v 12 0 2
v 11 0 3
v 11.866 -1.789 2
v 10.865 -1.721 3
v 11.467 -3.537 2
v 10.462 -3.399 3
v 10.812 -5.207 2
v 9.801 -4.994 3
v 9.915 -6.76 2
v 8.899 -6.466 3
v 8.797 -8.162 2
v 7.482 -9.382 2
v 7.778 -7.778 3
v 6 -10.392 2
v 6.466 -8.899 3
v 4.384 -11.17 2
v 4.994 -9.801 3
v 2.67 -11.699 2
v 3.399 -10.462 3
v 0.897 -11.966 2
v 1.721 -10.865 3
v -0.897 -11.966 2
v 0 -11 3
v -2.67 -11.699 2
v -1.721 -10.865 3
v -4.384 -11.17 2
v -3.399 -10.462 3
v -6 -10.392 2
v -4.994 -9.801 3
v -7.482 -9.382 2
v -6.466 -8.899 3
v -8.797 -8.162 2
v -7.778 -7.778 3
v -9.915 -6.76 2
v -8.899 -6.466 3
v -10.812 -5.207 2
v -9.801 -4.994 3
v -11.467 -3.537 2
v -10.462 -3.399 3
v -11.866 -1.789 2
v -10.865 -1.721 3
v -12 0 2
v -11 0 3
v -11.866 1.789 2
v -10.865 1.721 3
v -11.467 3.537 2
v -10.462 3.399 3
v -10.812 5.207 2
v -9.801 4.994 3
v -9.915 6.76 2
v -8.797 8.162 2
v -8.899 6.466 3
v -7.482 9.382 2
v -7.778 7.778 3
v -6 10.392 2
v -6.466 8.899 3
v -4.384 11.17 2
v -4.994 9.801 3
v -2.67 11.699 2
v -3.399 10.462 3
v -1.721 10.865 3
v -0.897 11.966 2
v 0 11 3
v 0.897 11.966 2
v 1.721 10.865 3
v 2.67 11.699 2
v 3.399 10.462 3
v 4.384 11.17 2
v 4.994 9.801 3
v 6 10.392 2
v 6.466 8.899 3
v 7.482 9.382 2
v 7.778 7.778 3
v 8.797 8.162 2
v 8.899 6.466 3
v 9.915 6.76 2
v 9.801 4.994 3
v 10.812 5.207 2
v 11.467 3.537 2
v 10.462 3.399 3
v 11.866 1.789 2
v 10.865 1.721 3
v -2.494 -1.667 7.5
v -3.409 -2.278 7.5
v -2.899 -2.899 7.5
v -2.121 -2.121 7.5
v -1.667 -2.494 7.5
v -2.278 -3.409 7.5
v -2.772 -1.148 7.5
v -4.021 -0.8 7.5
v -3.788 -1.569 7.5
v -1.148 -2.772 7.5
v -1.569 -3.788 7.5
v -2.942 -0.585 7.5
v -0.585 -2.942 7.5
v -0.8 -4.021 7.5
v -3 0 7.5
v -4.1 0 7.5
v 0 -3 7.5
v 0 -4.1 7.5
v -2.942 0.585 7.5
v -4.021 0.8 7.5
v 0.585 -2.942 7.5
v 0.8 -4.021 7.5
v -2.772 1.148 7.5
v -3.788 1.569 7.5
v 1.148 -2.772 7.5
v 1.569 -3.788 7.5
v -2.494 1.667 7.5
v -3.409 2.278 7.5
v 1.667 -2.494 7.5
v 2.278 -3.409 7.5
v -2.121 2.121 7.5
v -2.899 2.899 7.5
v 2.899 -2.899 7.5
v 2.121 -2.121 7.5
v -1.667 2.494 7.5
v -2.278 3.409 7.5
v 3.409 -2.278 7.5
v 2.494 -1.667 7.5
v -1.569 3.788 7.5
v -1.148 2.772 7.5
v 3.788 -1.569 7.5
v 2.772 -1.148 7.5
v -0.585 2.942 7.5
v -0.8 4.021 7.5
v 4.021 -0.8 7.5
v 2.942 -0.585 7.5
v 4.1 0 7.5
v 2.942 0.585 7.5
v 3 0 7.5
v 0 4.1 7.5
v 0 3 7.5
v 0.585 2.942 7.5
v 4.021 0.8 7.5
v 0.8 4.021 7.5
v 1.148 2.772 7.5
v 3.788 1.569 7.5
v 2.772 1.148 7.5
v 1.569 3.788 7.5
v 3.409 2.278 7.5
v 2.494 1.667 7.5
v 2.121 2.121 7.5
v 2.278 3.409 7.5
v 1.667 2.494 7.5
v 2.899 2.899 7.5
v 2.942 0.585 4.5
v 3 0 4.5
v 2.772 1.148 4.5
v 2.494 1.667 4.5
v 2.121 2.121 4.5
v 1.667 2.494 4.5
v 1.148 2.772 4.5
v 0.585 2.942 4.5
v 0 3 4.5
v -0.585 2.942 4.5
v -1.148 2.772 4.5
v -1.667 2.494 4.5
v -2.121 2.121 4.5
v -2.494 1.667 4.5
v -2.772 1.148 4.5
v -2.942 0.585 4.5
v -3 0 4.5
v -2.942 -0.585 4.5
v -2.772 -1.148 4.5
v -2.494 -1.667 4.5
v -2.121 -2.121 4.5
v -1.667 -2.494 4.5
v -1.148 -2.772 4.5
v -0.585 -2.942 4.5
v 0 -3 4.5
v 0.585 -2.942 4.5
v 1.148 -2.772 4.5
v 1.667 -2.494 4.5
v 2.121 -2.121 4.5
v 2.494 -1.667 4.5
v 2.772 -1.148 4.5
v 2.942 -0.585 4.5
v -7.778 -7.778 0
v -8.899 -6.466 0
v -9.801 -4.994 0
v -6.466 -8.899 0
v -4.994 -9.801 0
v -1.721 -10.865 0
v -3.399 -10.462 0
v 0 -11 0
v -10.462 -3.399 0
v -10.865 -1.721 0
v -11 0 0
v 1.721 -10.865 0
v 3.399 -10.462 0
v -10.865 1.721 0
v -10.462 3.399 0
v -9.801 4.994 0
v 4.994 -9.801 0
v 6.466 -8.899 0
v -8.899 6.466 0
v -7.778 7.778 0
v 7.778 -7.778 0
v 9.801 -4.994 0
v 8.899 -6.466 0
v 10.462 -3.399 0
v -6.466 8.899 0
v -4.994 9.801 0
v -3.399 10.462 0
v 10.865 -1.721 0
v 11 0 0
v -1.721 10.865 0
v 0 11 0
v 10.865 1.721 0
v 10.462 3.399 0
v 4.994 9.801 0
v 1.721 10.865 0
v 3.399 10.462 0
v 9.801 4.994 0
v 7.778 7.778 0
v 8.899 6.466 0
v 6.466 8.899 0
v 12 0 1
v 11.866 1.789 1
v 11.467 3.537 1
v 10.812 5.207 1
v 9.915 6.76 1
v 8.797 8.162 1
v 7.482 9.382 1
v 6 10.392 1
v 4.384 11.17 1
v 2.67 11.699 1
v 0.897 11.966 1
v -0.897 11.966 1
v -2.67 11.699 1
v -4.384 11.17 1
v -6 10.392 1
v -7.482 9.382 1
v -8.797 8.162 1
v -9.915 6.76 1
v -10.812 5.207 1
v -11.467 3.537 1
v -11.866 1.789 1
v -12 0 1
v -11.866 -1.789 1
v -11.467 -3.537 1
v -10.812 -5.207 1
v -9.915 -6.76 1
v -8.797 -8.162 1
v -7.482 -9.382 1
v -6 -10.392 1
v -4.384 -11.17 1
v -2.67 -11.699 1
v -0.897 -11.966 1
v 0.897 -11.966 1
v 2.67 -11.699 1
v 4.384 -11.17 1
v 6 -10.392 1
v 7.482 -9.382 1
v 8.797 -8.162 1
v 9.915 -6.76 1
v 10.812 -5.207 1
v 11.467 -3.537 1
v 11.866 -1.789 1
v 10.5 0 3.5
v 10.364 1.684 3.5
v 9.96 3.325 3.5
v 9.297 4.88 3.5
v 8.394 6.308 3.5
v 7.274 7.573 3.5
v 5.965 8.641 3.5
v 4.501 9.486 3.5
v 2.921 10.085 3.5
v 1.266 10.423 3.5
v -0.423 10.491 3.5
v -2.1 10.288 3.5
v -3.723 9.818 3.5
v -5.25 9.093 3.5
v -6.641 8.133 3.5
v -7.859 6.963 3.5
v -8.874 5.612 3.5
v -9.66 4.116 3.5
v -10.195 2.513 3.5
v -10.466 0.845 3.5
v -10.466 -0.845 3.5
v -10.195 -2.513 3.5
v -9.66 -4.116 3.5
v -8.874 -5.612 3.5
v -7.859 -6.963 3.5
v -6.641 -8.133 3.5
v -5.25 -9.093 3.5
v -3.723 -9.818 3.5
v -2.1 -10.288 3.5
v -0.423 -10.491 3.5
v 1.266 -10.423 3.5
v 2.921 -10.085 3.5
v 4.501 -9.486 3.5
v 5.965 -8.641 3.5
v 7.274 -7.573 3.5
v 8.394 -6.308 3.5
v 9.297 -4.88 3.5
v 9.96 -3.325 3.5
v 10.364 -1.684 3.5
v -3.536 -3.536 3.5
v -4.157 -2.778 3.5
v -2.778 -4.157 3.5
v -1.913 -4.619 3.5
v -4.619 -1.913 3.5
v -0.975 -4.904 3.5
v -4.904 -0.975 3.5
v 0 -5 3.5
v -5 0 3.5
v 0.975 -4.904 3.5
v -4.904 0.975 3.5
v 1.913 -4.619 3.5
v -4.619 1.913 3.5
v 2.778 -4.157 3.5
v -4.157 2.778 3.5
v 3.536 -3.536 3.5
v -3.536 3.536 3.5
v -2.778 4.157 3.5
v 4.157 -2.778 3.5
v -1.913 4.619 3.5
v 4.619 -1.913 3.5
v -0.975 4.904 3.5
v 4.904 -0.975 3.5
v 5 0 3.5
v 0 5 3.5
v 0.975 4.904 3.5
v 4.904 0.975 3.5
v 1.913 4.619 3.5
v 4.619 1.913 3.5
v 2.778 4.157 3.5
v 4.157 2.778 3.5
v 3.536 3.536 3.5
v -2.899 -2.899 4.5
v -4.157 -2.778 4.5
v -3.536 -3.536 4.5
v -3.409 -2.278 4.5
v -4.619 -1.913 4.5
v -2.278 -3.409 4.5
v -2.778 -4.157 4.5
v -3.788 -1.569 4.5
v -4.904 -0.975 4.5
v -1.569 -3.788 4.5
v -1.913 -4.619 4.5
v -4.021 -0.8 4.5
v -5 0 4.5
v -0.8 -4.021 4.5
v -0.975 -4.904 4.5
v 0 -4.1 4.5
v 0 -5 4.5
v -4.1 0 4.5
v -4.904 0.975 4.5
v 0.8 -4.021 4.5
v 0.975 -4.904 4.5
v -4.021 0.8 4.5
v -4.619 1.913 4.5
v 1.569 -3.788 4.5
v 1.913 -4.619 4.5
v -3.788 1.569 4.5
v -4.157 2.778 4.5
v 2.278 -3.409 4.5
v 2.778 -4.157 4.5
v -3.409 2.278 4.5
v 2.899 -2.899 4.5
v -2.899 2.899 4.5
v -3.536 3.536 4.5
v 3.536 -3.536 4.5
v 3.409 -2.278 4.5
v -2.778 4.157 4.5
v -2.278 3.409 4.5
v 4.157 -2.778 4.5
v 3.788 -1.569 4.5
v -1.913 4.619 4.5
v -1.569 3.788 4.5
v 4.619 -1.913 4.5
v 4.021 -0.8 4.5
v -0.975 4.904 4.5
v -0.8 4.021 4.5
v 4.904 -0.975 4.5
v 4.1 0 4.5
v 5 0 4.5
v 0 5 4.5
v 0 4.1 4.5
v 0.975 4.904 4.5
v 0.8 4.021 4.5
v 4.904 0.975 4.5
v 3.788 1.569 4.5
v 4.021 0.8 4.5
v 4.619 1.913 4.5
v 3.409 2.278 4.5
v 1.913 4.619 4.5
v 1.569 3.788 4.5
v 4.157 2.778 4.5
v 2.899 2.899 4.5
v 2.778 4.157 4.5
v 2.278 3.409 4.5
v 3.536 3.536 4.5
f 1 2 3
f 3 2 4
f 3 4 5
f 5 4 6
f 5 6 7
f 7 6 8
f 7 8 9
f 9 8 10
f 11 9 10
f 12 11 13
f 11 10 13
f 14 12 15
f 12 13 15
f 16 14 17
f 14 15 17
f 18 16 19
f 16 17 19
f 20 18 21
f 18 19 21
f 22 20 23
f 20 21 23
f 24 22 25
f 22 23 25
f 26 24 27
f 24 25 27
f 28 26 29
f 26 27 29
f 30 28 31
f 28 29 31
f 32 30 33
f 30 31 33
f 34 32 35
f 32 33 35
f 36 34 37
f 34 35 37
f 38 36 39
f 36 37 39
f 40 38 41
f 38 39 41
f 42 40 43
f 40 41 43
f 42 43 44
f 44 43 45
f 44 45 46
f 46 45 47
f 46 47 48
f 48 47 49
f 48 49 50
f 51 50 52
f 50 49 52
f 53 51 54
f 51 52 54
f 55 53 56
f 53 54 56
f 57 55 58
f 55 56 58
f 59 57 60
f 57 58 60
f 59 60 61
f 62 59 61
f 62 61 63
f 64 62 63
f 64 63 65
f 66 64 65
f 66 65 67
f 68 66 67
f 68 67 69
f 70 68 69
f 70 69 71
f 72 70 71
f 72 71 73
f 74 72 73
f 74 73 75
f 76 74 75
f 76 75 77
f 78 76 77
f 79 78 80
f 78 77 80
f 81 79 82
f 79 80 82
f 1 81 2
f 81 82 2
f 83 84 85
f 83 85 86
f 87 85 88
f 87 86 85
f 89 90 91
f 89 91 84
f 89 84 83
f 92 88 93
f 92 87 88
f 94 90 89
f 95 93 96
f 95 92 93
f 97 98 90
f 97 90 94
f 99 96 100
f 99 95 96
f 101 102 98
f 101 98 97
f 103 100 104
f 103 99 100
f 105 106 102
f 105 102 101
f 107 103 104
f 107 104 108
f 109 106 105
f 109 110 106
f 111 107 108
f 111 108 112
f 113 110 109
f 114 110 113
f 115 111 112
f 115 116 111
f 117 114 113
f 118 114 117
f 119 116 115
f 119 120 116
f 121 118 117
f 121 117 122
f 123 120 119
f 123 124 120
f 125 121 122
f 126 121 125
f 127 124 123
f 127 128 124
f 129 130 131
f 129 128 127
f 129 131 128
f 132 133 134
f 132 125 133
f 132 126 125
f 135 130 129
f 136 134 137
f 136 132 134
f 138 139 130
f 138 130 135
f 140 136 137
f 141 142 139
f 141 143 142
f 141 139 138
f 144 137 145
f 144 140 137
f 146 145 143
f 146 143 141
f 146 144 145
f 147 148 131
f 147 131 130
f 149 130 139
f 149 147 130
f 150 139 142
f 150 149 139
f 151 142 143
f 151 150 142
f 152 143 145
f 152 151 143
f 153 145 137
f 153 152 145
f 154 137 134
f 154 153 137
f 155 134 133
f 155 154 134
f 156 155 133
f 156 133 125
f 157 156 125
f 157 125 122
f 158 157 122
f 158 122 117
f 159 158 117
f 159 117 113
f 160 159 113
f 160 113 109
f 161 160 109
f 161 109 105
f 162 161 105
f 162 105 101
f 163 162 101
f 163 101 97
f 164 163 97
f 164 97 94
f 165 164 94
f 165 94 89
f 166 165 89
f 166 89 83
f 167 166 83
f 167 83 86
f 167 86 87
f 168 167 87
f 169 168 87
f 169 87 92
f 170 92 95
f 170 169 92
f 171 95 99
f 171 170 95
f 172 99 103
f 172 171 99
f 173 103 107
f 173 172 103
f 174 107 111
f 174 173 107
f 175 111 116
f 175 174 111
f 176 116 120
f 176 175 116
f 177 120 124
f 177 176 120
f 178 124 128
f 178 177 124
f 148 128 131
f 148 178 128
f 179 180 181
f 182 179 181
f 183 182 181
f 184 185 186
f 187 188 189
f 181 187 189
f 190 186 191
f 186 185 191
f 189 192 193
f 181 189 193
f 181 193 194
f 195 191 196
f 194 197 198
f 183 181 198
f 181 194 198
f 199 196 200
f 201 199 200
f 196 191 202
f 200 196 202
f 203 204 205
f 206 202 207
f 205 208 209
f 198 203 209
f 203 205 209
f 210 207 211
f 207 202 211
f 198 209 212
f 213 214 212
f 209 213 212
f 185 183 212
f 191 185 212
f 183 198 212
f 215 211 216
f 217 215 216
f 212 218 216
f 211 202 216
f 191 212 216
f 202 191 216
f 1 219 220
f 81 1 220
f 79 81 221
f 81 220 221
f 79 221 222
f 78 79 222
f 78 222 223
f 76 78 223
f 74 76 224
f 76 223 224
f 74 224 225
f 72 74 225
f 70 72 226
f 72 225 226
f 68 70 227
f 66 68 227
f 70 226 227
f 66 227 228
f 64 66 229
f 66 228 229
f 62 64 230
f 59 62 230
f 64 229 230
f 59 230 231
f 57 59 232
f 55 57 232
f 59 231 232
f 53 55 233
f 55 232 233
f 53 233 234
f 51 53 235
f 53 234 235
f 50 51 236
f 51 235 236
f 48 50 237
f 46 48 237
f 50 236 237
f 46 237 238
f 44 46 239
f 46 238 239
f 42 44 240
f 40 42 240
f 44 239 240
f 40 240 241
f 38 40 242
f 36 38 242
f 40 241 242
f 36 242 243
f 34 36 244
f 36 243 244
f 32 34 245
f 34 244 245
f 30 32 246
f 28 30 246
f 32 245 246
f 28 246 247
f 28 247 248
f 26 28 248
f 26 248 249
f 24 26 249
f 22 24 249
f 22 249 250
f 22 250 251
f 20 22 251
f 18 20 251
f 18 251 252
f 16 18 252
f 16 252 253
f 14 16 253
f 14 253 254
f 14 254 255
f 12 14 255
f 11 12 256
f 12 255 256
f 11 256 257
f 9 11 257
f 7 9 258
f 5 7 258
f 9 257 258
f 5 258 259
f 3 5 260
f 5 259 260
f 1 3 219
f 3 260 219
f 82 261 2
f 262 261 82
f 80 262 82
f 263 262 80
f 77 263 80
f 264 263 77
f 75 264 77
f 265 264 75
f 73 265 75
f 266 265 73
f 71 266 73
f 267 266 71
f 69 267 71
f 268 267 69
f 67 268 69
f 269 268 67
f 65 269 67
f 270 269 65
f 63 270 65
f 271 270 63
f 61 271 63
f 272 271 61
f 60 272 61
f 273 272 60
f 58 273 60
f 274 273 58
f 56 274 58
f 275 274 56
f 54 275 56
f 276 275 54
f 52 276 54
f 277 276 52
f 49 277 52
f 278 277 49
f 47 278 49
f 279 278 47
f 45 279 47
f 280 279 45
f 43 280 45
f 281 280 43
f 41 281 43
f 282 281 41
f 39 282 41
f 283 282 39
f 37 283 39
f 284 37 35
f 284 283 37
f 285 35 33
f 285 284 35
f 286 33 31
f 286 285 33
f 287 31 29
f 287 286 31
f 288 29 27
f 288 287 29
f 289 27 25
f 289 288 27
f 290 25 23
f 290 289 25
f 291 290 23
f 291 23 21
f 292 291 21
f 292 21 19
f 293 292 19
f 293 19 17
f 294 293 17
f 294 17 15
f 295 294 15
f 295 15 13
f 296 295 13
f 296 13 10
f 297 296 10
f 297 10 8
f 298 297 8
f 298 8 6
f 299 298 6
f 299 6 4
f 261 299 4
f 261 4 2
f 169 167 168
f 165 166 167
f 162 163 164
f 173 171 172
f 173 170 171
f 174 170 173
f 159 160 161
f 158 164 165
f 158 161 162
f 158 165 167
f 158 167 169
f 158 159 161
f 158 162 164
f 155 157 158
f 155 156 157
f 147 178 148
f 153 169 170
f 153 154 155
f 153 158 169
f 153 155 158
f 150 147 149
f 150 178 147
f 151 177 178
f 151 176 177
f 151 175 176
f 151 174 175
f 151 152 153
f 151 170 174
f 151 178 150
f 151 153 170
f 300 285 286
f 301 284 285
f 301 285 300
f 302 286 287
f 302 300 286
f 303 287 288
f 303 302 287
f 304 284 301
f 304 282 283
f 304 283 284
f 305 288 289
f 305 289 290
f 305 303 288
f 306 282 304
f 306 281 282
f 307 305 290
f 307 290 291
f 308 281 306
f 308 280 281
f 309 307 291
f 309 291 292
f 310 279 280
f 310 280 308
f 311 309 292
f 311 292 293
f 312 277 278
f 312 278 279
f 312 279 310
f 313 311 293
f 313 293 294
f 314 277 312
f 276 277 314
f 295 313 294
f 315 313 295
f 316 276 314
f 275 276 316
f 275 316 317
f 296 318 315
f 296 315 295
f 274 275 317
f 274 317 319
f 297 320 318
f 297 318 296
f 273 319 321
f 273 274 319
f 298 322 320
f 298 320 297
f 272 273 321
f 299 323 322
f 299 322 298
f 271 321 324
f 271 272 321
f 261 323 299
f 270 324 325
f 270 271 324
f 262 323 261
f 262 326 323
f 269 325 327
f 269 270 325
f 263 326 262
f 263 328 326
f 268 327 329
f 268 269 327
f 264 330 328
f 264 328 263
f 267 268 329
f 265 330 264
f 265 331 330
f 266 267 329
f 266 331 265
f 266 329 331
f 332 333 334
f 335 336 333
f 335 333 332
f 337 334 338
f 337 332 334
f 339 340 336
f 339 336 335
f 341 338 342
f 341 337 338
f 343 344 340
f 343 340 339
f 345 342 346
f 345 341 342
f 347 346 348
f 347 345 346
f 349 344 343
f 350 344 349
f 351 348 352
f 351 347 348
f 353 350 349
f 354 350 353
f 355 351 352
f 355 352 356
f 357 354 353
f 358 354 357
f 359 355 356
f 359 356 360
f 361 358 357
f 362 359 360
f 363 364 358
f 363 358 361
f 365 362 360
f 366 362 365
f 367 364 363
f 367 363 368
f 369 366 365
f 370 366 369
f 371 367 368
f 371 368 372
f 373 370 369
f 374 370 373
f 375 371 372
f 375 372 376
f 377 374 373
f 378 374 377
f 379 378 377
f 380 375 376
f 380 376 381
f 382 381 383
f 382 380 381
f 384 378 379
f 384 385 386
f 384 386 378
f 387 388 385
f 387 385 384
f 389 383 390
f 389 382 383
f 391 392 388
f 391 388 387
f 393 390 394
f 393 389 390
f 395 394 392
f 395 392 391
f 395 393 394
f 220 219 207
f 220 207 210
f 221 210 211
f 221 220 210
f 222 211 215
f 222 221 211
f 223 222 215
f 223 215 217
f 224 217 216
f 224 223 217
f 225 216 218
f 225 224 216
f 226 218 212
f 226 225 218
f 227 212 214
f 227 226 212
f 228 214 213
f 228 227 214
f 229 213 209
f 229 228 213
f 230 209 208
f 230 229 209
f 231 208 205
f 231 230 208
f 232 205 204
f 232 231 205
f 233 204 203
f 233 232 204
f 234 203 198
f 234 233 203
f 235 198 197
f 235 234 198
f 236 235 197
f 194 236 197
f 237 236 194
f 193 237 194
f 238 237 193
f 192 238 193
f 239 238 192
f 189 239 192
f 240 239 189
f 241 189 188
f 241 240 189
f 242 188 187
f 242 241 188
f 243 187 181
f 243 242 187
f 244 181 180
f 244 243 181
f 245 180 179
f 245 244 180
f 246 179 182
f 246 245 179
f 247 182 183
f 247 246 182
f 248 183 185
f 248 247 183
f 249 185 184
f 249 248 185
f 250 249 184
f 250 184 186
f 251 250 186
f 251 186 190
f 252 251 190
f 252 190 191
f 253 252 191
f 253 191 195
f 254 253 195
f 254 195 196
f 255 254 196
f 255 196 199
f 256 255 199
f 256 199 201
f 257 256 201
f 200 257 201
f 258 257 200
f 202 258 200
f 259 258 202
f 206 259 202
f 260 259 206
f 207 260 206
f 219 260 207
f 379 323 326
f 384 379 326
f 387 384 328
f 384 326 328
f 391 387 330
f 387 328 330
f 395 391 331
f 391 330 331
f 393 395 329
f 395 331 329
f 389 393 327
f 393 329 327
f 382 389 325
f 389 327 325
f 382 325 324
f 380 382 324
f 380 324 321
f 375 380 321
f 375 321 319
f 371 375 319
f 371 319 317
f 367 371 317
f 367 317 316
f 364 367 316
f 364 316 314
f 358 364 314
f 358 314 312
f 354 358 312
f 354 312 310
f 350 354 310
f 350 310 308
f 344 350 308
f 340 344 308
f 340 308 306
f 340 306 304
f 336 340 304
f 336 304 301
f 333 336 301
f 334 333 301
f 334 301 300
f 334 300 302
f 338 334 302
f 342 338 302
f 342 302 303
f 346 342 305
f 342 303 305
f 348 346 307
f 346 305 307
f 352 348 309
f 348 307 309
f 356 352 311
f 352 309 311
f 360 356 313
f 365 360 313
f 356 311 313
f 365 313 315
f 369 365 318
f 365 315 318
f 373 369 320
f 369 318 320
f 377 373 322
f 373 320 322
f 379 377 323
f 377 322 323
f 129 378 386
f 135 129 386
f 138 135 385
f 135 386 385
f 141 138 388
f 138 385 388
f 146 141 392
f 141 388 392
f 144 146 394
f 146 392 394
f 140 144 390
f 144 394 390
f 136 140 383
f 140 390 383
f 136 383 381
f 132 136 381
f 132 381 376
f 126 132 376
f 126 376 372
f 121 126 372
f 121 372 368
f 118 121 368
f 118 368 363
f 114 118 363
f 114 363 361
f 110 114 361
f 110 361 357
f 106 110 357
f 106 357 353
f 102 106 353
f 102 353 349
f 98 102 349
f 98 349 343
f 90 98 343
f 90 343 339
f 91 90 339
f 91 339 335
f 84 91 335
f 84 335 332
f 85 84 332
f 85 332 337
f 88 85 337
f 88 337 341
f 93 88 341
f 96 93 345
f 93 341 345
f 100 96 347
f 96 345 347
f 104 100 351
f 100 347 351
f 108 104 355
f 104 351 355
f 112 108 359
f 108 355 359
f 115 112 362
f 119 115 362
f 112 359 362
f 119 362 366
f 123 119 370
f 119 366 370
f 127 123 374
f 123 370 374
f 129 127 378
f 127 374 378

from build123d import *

# Parameters (mm, degrees)
F0_R     = 12
F0_R_2   = 11
F0_R_3   = 5
F0_R_4   = 4.1
F0_R_5   = 3
F1_DEPTH = 2
F2_DEPTH = 3.5
F3_SIZE  = 0.99999
F4_DEPTH = 4.5
F5_DEPTH = 7.5
F6_SIZE  = 1
F7_SIZE  = 0.5


# Not quite as in the source:
# - a fillet or chamfer is up to 0.001 mm smaller than in the source, because OpenCascade refuses the exact size


with BuildPart() as f1:
    # F0 (on Top) → F1 (new body)
    with BuildSketch(Plane.XY):
        Circle(F0_R)
        Circle(F0_R_2, mode=Mode.SUBTRACT)
        Circle(F0_R_2)
        Circle(F0_R_3, mode=Mode.SUBTRACT)
        Circle(F0_R_3)
        Circle(F0_R_4, mode=Mode.SUBTRACT)
        Circle(F0_R_4)
        Circle(F0_R_5, mode=Mode.SUBTRACT)
        Circle(F0_R_5)
    extrude(amount=F1_DEPTH)

    # F0 (on Top) → F2 (join)
    with BuildSketch(Plane.XY):
        Circle(F0_R_2)
        Circle(F0_R_3, mode=Mode.SUBTRACT)
        Circle(F0_R_3)
        Circle(F0_R_4, mode=Mode.SUBTRACT)
        Circle(F0_R_4)
        Circle(F0_R_5, mode=Mode.SUBTRACT)
        Circle(F0_R_5)
    extrude(amount=F2_DEPTH)

    # F3 (size 1 in the source; OpenCascade refuses exactly that, so slightly less here)
    f3_edges = [f1.edges().sort_by_distance(p)[0] for p in [
        (-11, 0, 2),
    ]]
    chamfer(f3_edges, length=F3_SIZE)

    # F0 (on Top) → F4 (join)
    with BuildSketch(Plane.XY):
        Circle(F0_R_3)
        Circle(F0_R_4, mode=Mode.SUBTRACT)
        Circle(F0_R_4)
        Circle(F0_R_5, mode=Mode.SUBTRACT)
        Circle(F0_R_5)
    extrude(amount=F4_DEPTH)

    # F0 (on Top) → F5 (join)
    with BuildSketch(Plane.XY):
        Circle(F0_R_4)
        Circle(F0_R_5, mode=Mode.SUBTRACT)
    extrude(amount=F5_DEPTH)

    # F6
    f6_edges = [f1.edges().sort_by_distance(p)[0] for p in [
        (-12, 0, 0),
    ]]
    chamfer(f6_edges, length=F6_SIZE)

    # F7
    f7_edges = [f1.edges().sort_by_distance(p)[0] for p in [
        (-11, 0, 3.5),
    ]]
    chamfer(f7_edges, length=F7_SIZE)


solid = f1.part
